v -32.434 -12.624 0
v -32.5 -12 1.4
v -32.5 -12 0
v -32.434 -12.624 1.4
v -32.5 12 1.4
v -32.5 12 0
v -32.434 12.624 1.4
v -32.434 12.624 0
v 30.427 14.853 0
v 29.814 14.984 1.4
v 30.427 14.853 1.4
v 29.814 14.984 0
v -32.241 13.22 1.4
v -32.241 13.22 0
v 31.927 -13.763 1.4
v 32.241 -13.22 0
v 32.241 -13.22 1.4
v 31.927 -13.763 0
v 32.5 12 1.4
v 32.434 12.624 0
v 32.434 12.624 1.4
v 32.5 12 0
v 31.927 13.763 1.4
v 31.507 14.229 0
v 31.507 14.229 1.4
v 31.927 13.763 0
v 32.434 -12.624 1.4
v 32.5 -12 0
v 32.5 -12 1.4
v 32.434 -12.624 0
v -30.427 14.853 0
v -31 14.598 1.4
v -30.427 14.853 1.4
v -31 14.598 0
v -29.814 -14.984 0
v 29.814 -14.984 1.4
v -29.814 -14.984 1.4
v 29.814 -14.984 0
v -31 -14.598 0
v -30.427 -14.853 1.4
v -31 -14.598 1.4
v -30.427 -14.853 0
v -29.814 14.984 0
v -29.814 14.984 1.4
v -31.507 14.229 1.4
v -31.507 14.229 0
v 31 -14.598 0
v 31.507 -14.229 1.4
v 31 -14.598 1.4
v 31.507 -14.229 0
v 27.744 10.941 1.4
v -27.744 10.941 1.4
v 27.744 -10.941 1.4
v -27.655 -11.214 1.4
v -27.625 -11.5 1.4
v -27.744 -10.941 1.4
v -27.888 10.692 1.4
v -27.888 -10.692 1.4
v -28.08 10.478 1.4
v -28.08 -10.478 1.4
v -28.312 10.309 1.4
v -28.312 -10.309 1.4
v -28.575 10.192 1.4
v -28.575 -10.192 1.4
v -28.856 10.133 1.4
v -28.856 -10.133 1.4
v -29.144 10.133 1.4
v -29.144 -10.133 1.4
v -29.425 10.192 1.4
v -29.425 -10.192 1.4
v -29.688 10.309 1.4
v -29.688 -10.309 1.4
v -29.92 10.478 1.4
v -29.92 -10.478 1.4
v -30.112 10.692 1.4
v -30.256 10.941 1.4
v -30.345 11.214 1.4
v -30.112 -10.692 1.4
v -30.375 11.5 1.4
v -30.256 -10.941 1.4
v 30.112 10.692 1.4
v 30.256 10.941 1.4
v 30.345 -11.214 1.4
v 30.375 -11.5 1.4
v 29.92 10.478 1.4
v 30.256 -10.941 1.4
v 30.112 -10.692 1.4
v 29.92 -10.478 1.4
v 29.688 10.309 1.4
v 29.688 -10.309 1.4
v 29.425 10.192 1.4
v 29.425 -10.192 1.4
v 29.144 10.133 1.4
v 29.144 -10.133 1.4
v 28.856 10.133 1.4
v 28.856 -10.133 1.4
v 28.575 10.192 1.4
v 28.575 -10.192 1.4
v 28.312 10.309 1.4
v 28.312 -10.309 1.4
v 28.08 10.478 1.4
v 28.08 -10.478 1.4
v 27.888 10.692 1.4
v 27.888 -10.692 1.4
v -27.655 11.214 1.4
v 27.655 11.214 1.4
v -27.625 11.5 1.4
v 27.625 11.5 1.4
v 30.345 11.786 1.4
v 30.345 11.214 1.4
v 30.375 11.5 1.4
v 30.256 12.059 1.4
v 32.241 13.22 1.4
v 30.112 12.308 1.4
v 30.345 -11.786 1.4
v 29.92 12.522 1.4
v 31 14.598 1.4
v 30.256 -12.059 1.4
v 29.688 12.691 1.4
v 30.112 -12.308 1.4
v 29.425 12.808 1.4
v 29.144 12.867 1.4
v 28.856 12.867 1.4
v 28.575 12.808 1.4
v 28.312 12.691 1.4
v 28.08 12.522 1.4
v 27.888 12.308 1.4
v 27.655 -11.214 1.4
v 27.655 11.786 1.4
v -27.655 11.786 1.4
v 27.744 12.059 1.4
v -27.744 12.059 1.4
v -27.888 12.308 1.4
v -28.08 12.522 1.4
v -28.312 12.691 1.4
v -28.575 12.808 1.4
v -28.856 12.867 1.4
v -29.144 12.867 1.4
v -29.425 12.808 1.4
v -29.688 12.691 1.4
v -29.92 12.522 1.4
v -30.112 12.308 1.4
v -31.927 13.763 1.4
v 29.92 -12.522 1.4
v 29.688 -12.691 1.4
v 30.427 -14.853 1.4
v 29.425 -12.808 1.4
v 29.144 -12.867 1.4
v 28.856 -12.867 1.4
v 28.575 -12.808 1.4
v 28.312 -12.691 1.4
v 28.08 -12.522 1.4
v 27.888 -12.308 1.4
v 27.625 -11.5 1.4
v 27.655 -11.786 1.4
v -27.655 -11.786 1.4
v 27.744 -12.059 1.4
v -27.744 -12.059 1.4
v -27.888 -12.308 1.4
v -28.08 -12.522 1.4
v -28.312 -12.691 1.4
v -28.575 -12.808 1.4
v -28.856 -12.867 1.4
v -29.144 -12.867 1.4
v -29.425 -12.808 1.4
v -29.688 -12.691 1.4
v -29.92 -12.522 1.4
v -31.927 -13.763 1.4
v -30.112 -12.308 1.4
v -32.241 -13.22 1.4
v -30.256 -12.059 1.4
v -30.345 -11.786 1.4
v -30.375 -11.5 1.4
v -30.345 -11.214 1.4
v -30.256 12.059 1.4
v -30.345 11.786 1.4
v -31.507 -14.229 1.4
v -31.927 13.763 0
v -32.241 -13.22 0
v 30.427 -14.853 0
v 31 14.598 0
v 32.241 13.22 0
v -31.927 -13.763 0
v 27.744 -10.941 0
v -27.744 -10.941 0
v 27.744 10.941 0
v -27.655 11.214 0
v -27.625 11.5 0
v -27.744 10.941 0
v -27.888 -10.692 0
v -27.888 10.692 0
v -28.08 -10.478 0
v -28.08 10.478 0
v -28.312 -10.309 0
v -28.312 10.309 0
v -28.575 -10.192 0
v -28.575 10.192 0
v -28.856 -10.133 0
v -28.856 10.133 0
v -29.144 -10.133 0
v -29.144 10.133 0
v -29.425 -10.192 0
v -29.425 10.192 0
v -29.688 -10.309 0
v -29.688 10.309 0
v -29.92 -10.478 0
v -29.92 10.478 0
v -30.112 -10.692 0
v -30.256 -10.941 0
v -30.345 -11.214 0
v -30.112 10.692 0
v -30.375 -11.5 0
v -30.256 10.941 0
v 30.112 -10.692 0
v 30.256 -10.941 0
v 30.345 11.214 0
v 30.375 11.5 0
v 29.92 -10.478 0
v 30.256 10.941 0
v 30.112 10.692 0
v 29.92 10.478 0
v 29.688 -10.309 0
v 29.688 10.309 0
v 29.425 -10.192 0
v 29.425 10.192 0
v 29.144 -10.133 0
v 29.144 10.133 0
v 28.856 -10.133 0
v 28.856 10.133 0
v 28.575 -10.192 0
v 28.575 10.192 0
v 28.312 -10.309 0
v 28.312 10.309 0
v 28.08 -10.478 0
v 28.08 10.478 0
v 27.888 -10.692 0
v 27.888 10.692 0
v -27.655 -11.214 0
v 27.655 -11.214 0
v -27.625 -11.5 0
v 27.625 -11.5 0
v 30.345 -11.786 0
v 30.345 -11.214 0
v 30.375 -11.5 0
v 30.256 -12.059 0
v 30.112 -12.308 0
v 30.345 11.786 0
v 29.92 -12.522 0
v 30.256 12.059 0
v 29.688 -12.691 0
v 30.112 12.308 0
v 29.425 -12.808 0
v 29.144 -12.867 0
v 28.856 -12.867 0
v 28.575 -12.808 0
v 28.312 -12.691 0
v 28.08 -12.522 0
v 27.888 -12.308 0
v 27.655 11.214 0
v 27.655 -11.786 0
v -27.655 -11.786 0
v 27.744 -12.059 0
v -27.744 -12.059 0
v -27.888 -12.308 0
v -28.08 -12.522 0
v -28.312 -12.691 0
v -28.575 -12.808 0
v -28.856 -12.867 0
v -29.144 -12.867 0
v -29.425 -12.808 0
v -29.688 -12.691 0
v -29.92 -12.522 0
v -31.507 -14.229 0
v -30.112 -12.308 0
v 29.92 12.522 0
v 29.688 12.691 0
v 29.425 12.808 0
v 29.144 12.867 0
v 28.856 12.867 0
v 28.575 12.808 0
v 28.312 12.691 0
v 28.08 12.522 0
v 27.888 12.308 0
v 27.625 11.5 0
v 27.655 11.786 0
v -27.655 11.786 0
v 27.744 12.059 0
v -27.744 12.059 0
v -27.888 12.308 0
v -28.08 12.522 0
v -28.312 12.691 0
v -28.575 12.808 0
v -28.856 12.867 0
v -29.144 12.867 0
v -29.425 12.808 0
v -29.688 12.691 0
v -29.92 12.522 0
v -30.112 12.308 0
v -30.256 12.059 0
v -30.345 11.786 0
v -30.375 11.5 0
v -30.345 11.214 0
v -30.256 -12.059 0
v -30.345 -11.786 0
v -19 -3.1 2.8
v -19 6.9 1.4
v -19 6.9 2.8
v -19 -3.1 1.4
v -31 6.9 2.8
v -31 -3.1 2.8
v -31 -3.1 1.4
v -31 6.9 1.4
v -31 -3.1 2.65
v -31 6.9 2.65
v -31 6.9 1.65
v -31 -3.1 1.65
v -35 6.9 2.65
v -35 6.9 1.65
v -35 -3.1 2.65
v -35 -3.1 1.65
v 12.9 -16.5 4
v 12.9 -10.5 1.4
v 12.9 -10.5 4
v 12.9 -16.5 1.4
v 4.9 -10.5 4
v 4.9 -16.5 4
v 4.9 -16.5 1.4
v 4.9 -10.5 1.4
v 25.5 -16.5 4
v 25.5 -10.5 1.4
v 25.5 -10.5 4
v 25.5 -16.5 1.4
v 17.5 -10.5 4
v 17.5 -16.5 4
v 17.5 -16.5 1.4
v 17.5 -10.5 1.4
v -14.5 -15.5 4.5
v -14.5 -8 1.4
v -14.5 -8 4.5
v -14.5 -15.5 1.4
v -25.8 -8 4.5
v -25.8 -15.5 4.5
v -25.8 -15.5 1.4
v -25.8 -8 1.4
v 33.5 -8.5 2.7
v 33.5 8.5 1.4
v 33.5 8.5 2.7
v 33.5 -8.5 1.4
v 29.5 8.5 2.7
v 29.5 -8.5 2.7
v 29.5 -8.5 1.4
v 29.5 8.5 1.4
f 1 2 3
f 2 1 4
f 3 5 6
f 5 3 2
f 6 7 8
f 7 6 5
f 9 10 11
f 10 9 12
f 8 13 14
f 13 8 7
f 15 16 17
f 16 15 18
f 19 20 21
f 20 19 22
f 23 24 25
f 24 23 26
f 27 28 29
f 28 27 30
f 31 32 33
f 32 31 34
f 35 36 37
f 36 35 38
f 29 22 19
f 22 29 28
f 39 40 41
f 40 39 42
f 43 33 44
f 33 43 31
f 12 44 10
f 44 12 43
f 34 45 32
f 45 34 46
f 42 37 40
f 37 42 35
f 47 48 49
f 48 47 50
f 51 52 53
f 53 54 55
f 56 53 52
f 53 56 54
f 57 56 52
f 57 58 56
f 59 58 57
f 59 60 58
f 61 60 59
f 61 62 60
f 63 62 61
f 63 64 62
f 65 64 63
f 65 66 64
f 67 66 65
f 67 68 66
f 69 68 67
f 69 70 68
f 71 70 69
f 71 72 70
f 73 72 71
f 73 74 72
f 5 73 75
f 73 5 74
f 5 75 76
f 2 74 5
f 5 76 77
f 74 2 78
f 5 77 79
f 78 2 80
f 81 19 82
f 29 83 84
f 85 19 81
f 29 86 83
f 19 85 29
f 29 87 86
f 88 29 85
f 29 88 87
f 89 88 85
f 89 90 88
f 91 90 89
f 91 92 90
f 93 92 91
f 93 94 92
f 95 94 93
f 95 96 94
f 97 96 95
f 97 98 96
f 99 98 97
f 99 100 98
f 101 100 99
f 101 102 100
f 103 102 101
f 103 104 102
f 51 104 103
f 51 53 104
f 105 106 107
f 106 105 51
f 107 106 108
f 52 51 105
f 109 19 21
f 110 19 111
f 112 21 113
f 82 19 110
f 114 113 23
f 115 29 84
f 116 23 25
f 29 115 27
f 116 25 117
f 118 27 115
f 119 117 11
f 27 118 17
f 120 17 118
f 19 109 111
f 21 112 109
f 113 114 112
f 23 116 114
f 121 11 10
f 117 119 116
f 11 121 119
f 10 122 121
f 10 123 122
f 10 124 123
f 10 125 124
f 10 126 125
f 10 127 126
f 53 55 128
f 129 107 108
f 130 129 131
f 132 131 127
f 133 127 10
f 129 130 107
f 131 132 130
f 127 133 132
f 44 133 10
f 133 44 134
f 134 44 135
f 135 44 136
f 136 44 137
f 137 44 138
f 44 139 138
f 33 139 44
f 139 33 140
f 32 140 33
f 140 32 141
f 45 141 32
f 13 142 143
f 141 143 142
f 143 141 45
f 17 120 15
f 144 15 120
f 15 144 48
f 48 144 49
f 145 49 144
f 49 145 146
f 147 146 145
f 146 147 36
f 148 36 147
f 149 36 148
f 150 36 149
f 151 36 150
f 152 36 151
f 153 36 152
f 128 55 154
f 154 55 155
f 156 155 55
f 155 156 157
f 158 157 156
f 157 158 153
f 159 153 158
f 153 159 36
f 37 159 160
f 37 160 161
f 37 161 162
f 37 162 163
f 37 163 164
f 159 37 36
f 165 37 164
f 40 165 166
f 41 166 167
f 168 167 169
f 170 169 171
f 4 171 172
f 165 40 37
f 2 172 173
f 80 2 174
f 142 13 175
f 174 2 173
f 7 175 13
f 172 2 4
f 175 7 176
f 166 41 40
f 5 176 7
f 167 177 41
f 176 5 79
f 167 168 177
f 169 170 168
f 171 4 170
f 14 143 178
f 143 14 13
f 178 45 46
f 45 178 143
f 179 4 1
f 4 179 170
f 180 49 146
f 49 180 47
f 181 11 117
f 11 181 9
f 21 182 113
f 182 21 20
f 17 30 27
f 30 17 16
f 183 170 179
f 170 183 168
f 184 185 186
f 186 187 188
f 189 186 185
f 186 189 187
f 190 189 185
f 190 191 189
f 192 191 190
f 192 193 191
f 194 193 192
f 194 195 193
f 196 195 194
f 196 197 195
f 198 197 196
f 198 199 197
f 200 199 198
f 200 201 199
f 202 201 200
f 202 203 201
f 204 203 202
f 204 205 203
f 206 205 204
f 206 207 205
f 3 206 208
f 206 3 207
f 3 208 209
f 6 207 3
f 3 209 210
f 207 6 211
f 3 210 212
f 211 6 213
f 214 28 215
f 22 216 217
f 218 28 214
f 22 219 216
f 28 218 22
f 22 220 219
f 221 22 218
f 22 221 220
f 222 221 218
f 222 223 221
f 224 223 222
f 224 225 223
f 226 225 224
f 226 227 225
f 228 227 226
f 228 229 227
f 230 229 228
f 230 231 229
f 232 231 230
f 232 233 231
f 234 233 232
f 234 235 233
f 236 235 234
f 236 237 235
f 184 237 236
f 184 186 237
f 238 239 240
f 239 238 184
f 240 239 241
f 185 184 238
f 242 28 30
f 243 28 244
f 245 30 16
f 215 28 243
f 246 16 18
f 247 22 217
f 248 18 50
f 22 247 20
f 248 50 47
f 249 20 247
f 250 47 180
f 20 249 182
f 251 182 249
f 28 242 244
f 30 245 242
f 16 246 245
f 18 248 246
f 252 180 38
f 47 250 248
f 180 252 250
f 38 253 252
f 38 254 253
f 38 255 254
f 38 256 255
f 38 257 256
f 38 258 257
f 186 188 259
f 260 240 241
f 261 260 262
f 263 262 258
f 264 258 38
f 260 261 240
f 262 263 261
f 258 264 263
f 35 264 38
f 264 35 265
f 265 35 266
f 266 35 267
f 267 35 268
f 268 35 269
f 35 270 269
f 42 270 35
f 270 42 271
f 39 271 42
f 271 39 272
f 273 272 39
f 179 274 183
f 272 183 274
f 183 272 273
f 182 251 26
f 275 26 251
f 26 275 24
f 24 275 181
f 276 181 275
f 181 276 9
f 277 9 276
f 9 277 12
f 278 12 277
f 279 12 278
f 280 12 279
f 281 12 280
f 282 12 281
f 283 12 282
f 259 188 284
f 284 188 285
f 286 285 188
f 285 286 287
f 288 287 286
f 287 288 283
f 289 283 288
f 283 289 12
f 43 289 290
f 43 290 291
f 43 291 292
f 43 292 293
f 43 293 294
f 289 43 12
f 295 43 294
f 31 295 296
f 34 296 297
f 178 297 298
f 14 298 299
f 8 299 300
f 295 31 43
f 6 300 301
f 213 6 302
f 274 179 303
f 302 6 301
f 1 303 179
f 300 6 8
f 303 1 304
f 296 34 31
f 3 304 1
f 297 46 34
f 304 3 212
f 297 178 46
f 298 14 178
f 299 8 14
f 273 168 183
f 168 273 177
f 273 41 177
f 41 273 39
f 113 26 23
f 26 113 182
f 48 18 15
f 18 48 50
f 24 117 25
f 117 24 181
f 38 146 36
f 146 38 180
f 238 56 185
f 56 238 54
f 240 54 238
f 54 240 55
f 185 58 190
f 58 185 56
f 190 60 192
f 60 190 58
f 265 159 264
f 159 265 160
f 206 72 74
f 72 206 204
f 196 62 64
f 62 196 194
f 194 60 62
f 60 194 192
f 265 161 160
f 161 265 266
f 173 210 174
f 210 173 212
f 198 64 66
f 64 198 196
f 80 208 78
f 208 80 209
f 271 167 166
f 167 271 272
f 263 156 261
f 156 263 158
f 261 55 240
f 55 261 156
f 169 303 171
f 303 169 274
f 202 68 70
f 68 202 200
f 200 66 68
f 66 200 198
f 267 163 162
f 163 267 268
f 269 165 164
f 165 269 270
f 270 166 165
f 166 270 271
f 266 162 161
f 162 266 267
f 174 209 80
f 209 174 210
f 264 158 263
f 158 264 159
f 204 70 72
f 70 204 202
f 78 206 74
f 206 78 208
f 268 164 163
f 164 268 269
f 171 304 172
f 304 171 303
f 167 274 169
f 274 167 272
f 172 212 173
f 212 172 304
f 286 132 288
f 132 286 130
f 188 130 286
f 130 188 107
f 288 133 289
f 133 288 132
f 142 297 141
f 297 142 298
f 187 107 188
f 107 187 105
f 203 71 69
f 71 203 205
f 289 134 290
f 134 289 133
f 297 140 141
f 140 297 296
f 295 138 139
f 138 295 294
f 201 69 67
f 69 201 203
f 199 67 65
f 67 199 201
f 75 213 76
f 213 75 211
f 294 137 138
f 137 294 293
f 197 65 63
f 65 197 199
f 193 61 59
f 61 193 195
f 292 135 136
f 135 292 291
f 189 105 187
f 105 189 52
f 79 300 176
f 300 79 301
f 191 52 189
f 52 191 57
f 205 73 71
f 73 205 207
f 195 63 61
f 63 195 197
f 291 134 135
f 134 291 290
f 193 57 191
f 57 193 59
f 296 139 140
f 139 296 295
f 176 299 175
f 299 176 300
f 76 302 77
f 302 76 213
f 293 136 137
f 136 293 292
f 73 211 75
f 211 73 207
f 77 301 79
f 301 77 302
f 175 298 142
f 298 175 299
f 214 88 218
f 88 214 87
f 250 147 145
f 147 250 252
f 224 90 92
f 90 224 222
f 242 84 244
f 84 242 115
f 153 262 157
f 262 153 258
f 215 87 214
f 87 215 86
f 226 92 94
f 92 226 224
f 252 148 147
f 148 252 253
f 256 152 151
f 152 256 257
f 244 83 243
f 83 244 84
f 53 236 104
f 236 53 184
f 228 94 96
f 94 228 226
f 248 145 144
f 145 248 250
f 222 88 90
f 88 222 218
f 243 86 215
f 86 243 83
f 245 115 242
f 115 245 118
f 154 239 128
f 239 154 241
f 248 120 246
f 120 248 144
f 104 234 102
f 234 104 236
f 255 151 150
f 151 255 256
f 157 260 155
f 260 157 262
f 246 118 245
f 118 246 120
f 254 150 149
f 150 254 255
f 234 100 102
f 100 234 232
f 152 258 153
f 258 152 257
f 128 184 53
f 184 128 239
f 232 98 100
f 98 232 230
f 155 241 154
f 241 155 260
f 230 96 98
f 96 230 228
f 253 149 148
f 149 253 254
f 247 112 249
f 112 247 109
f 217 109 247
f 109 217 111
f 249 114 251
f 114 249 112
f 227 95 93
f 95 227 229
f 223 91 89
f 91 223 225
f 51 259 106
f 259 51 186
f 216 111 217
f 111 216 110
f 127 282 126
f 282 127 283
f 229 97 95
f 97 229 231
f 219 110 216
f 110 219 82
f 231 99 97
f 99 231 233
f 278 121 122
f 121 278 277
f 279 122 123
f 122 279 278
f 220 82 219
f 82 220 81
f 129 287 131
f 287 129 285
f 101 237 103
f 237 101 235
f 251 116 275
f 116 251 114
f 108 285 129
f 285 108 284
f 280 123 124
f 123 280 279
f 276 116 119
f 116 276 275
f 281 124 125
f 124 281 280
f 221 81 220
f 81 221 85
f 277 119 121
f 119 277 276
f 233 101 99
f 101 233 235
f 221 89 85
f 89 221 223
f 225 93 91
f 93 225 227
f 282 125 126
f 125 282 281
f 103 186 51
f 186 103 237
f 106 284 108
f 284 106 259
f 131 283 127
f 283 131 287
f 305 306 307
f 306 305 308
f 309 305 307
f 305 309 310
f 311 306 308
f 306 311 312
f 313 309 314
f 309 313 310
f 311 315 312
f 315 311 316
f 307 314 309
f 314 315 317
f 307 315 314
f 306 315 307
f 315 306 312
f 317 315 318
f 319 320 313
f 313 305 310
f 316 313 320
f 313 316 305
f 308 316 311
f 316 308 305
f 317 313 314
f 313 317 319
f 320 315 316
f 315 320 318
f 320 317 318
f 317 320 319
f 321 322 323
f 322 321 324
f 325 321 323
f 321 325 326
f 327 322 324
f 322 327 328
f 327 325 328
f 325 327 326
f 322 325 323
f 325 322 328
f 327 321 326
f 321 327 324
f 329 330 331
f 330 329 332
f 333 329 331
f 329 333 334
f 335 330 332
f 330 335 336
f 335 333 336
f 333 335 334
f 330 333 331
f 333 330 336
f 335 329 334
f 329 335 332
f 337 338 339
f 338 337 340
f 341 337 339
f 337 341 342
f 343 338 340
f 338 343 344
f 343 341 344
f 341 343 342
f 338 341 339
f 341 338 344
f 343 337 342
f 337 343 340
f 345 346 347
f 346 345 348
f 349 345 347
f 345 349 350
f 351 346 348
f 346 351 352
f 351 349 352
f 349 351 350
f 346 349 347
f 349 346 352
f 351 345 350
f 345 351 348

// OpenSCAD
// file: ../../lib/device/device_raspberrypi.scad
/* (c) 2016++ by Saarbastler 
**  https://github.com/saarbastler/library.scad
**
** Raspberry PI model library for generating cases etc.
*/

use <./component.scad>

$fn = 30;

_delta = 0.005;

_c_gray  = [.4, .4, .4];
_c_gold  = [.8, .5, .0];
_c_metal = [.7, .7, .7];
_c_black = [.3, .3, .3];
_c_green_pcb = [.0, .5, .25];
_c_yellow = [.7, .7, .3];


//raspberry_pi_3();
//raspberry_pi_zero(true);


board_dim = [85, 56, 1.25];
hole_d = 2.75;

microusb_dim = [6, 8, 3];
microusb_pos = [10.6 - microusb_dim[1]/2, -1, board_dim[2]];

hdmi_dim = [11.5, 15, 6.5];
hdmi_pos = [32 - hdmi_dim[1]/2, -1, board_dim[2]];

jack_dim = [14.5, 7, 6];
jack_pos = [53.5 - jack_dim[1]/2, -2, board_dim[2]];

gpio_dim = [51, 5, 8.5];
gpio_pos = [3.5+29-gpio_dim[0]/2, board_dim[1]-gpio_dim[1]-1, board_dim[2]];

usbx2_dim = [17.25, 15, 16.5];
usbx2_pos_tab = [
    [board_dim[0]-usbx2_dim[0]+2, 29-usbx2_dim[1]/2, board_dim[2]],
    [board_dim[0]-usbx2_dim[0]+2, 47-usbx2_dim[1]/2, board_dim[2]],
];

ethernet_dim = [21, 16, 13.5];
ethernet_pos = [board_dim[0]-ethernet_dim[0]+2, 10.25-ethernet_dim[1]/2, board_dim[2]];

serialcon_dim = [2.5, 22, 5.5];
serialcon_pos_tab = [
    [1.1, 3.5+28-serialcon_dim[1]/2, board_dim[2]],
    [32+13-serialcon_dim[0]/2, .5, board_dim[2]],
];

sdslot_dim = [11.5, 12, 1.25];
sdslot_pos = [1.75, (board_dim[1]-sdslot_dim[1])/2, -sdslot_dim[2]];

sdcard_dim = [15, 11, 1];
sdcard_pos = [sdslot_pos[0]+sdslot_dim[0]-.25-sdcard_dim[0],
              (board_dim[1]-sdcard_dim[1])/2, -sdcard_dim[2]];

module pinHeader(pins, rows)
{
    color("darkgrey") cube([2.54*pins,2.54*rows,1.27]);
  
    for(x=[0:pins-1],y=[0:rows-1])
        translate([x*2.54+(1.27+.6)/2,y*2.54+(1.27+.6)/2,-3.5])
          cube([0.6,0.6,11.5]);
}

module _plate() {
    corner_radius = 3;
    l = board_dim[0];
    w = board_dim[1];
    h = board_dim[2];
    ring_d = 6.2;
    color(_c_green_pcb) {
        linear_extrude(height=h) {
            difference() {
                translate([corner_radius, corner_radius]) {
                    minkowski() {
                        square([l-corner_radius*2, w-corner_radius*2]);
                        circle(r=corner_radius);
                    }
                }
                hole_positions()
                    circle(d=ring_d);
            }
        }
    }
    color(_c_yellow) {
        linear_extrude(height=board_dim[2]) {
            hole_positions() {
                difference() {
                    circle(d=ring_d);
                    circle(d=hole_d);
                }
            }
        }
    }
}

module _sdslot() {
    color(_c_metal)
        cube(sdslot_dim);
}

module _sdcard() {
    color(_c_black)
        cube(sdcard_dim);
}

module usbx2_pos() {
    for (pos = usbx2_pos_tab)
        translate(pos)
            children();
}

module raspberry_pi_3() {
    _plate();

    translate(microusb_pos)         microusb(microusb_dim, direction="S");
    translate(hdmi_pos)             hdmi(hdmi_dim, direction="S");
    translate(jack_pos)             jack(jack_dim, direction="S");
    translate(gpio_pos)             pin_header_pitch254(20, 2, dim=gpio_dim);
    usbx2_pos()                     usbx2(usbx2_dim, direction="E");
    translate(ethernet_pos)         ethernet(ethernet_dim, direction="E", swap_led=true);
    translate(serialcon_pos_tab[0]) serialcon(serialcon_dim, direction="E");
    translate(serialcon_pos_tab[1]) serialcon(serialcon_dim, direction="W");
    translate(sdslot_pos)           _sdslot();
    translate(sdcard_pos)           _sdcard();
}

module hole_positions() {
    hole_pad = 3.5;
    hole_x1 = hole_pad;
    hole_x2 = hole_pad + 58;
    hole_y1 = hole_pad;
    hole_y2 = hole_pad + 49;

    for (y = [hole_y1, hole_y2])
        for (x = [hole_x1, hole_x2])
            translate([x, y])
                children();
}

module raspberry_pi_zero(withHeader=false)
{
  // PCB
  color("limegreen") difference()
  {
    hull()
    {
      translate([-(65-6)/2,-(30-6)/2,0]) cylinder(r=3, h=1.4 );
      translate([-(65-6)/2, (30-6)/2,0]) cylinder(r=3, h=1.4 );
      translate([ (65-6)/2,-(30-6)/2,0]) cylinder(r=3, h=1.4 );
      translate([ (65-6)/2, (30-6)/2,0]) cylinder(r=3, h=1.4 );
    }
    
    translate([-65/2+3.5,-23/2,-1]) cylinder(d=2.75, h=3);
    translate([-65/2+3.5, 23/2,-1]) cylinder(d=2.75, h=3);
    translate([65/2-3.5,-23/2,-1]) cylinder(d=2.75, h=3);
    translate([65/2-3.5, 23/2,-1]) cylinder(d=2.75, h=3);
  }

  // Header
  if( withHeader)
    translate([3.5-65/2+29-10*2.54,30/2-3.5-2.54,1.4])
      pinHeader(20,2);
    
  translate([-65/2,-30/2,1.4])
  {
    // Micro SD Card
    color("silver") translate([1.5,16.9-5,0]) cube([12,10,1.4]);    
    color("darkgrey") translate([-2.5,16.9-5,0.25]) cube([4,10,1]);
    
    // micro USB
    color("silver") translate([41.4-8/2,-1.5,0]) cube([8,6,2.6]);
    color("silver") translate([54-8/2,-1.5,0]) cube([8,6,2.6]);

    // HDMI
    color("silver")  translate([12.4-11.4/2,-.5,0]) cube([11.3,7.5,3.1]);
    
    // Camera
    color("darkgrey") translate([65-3,(30-17)/2,0]) cube([4,17,1.3]);  
  }
}
// main file
include <../../lib/device/device_raspberrypi.scad>;

raspberry_pi_zero();
